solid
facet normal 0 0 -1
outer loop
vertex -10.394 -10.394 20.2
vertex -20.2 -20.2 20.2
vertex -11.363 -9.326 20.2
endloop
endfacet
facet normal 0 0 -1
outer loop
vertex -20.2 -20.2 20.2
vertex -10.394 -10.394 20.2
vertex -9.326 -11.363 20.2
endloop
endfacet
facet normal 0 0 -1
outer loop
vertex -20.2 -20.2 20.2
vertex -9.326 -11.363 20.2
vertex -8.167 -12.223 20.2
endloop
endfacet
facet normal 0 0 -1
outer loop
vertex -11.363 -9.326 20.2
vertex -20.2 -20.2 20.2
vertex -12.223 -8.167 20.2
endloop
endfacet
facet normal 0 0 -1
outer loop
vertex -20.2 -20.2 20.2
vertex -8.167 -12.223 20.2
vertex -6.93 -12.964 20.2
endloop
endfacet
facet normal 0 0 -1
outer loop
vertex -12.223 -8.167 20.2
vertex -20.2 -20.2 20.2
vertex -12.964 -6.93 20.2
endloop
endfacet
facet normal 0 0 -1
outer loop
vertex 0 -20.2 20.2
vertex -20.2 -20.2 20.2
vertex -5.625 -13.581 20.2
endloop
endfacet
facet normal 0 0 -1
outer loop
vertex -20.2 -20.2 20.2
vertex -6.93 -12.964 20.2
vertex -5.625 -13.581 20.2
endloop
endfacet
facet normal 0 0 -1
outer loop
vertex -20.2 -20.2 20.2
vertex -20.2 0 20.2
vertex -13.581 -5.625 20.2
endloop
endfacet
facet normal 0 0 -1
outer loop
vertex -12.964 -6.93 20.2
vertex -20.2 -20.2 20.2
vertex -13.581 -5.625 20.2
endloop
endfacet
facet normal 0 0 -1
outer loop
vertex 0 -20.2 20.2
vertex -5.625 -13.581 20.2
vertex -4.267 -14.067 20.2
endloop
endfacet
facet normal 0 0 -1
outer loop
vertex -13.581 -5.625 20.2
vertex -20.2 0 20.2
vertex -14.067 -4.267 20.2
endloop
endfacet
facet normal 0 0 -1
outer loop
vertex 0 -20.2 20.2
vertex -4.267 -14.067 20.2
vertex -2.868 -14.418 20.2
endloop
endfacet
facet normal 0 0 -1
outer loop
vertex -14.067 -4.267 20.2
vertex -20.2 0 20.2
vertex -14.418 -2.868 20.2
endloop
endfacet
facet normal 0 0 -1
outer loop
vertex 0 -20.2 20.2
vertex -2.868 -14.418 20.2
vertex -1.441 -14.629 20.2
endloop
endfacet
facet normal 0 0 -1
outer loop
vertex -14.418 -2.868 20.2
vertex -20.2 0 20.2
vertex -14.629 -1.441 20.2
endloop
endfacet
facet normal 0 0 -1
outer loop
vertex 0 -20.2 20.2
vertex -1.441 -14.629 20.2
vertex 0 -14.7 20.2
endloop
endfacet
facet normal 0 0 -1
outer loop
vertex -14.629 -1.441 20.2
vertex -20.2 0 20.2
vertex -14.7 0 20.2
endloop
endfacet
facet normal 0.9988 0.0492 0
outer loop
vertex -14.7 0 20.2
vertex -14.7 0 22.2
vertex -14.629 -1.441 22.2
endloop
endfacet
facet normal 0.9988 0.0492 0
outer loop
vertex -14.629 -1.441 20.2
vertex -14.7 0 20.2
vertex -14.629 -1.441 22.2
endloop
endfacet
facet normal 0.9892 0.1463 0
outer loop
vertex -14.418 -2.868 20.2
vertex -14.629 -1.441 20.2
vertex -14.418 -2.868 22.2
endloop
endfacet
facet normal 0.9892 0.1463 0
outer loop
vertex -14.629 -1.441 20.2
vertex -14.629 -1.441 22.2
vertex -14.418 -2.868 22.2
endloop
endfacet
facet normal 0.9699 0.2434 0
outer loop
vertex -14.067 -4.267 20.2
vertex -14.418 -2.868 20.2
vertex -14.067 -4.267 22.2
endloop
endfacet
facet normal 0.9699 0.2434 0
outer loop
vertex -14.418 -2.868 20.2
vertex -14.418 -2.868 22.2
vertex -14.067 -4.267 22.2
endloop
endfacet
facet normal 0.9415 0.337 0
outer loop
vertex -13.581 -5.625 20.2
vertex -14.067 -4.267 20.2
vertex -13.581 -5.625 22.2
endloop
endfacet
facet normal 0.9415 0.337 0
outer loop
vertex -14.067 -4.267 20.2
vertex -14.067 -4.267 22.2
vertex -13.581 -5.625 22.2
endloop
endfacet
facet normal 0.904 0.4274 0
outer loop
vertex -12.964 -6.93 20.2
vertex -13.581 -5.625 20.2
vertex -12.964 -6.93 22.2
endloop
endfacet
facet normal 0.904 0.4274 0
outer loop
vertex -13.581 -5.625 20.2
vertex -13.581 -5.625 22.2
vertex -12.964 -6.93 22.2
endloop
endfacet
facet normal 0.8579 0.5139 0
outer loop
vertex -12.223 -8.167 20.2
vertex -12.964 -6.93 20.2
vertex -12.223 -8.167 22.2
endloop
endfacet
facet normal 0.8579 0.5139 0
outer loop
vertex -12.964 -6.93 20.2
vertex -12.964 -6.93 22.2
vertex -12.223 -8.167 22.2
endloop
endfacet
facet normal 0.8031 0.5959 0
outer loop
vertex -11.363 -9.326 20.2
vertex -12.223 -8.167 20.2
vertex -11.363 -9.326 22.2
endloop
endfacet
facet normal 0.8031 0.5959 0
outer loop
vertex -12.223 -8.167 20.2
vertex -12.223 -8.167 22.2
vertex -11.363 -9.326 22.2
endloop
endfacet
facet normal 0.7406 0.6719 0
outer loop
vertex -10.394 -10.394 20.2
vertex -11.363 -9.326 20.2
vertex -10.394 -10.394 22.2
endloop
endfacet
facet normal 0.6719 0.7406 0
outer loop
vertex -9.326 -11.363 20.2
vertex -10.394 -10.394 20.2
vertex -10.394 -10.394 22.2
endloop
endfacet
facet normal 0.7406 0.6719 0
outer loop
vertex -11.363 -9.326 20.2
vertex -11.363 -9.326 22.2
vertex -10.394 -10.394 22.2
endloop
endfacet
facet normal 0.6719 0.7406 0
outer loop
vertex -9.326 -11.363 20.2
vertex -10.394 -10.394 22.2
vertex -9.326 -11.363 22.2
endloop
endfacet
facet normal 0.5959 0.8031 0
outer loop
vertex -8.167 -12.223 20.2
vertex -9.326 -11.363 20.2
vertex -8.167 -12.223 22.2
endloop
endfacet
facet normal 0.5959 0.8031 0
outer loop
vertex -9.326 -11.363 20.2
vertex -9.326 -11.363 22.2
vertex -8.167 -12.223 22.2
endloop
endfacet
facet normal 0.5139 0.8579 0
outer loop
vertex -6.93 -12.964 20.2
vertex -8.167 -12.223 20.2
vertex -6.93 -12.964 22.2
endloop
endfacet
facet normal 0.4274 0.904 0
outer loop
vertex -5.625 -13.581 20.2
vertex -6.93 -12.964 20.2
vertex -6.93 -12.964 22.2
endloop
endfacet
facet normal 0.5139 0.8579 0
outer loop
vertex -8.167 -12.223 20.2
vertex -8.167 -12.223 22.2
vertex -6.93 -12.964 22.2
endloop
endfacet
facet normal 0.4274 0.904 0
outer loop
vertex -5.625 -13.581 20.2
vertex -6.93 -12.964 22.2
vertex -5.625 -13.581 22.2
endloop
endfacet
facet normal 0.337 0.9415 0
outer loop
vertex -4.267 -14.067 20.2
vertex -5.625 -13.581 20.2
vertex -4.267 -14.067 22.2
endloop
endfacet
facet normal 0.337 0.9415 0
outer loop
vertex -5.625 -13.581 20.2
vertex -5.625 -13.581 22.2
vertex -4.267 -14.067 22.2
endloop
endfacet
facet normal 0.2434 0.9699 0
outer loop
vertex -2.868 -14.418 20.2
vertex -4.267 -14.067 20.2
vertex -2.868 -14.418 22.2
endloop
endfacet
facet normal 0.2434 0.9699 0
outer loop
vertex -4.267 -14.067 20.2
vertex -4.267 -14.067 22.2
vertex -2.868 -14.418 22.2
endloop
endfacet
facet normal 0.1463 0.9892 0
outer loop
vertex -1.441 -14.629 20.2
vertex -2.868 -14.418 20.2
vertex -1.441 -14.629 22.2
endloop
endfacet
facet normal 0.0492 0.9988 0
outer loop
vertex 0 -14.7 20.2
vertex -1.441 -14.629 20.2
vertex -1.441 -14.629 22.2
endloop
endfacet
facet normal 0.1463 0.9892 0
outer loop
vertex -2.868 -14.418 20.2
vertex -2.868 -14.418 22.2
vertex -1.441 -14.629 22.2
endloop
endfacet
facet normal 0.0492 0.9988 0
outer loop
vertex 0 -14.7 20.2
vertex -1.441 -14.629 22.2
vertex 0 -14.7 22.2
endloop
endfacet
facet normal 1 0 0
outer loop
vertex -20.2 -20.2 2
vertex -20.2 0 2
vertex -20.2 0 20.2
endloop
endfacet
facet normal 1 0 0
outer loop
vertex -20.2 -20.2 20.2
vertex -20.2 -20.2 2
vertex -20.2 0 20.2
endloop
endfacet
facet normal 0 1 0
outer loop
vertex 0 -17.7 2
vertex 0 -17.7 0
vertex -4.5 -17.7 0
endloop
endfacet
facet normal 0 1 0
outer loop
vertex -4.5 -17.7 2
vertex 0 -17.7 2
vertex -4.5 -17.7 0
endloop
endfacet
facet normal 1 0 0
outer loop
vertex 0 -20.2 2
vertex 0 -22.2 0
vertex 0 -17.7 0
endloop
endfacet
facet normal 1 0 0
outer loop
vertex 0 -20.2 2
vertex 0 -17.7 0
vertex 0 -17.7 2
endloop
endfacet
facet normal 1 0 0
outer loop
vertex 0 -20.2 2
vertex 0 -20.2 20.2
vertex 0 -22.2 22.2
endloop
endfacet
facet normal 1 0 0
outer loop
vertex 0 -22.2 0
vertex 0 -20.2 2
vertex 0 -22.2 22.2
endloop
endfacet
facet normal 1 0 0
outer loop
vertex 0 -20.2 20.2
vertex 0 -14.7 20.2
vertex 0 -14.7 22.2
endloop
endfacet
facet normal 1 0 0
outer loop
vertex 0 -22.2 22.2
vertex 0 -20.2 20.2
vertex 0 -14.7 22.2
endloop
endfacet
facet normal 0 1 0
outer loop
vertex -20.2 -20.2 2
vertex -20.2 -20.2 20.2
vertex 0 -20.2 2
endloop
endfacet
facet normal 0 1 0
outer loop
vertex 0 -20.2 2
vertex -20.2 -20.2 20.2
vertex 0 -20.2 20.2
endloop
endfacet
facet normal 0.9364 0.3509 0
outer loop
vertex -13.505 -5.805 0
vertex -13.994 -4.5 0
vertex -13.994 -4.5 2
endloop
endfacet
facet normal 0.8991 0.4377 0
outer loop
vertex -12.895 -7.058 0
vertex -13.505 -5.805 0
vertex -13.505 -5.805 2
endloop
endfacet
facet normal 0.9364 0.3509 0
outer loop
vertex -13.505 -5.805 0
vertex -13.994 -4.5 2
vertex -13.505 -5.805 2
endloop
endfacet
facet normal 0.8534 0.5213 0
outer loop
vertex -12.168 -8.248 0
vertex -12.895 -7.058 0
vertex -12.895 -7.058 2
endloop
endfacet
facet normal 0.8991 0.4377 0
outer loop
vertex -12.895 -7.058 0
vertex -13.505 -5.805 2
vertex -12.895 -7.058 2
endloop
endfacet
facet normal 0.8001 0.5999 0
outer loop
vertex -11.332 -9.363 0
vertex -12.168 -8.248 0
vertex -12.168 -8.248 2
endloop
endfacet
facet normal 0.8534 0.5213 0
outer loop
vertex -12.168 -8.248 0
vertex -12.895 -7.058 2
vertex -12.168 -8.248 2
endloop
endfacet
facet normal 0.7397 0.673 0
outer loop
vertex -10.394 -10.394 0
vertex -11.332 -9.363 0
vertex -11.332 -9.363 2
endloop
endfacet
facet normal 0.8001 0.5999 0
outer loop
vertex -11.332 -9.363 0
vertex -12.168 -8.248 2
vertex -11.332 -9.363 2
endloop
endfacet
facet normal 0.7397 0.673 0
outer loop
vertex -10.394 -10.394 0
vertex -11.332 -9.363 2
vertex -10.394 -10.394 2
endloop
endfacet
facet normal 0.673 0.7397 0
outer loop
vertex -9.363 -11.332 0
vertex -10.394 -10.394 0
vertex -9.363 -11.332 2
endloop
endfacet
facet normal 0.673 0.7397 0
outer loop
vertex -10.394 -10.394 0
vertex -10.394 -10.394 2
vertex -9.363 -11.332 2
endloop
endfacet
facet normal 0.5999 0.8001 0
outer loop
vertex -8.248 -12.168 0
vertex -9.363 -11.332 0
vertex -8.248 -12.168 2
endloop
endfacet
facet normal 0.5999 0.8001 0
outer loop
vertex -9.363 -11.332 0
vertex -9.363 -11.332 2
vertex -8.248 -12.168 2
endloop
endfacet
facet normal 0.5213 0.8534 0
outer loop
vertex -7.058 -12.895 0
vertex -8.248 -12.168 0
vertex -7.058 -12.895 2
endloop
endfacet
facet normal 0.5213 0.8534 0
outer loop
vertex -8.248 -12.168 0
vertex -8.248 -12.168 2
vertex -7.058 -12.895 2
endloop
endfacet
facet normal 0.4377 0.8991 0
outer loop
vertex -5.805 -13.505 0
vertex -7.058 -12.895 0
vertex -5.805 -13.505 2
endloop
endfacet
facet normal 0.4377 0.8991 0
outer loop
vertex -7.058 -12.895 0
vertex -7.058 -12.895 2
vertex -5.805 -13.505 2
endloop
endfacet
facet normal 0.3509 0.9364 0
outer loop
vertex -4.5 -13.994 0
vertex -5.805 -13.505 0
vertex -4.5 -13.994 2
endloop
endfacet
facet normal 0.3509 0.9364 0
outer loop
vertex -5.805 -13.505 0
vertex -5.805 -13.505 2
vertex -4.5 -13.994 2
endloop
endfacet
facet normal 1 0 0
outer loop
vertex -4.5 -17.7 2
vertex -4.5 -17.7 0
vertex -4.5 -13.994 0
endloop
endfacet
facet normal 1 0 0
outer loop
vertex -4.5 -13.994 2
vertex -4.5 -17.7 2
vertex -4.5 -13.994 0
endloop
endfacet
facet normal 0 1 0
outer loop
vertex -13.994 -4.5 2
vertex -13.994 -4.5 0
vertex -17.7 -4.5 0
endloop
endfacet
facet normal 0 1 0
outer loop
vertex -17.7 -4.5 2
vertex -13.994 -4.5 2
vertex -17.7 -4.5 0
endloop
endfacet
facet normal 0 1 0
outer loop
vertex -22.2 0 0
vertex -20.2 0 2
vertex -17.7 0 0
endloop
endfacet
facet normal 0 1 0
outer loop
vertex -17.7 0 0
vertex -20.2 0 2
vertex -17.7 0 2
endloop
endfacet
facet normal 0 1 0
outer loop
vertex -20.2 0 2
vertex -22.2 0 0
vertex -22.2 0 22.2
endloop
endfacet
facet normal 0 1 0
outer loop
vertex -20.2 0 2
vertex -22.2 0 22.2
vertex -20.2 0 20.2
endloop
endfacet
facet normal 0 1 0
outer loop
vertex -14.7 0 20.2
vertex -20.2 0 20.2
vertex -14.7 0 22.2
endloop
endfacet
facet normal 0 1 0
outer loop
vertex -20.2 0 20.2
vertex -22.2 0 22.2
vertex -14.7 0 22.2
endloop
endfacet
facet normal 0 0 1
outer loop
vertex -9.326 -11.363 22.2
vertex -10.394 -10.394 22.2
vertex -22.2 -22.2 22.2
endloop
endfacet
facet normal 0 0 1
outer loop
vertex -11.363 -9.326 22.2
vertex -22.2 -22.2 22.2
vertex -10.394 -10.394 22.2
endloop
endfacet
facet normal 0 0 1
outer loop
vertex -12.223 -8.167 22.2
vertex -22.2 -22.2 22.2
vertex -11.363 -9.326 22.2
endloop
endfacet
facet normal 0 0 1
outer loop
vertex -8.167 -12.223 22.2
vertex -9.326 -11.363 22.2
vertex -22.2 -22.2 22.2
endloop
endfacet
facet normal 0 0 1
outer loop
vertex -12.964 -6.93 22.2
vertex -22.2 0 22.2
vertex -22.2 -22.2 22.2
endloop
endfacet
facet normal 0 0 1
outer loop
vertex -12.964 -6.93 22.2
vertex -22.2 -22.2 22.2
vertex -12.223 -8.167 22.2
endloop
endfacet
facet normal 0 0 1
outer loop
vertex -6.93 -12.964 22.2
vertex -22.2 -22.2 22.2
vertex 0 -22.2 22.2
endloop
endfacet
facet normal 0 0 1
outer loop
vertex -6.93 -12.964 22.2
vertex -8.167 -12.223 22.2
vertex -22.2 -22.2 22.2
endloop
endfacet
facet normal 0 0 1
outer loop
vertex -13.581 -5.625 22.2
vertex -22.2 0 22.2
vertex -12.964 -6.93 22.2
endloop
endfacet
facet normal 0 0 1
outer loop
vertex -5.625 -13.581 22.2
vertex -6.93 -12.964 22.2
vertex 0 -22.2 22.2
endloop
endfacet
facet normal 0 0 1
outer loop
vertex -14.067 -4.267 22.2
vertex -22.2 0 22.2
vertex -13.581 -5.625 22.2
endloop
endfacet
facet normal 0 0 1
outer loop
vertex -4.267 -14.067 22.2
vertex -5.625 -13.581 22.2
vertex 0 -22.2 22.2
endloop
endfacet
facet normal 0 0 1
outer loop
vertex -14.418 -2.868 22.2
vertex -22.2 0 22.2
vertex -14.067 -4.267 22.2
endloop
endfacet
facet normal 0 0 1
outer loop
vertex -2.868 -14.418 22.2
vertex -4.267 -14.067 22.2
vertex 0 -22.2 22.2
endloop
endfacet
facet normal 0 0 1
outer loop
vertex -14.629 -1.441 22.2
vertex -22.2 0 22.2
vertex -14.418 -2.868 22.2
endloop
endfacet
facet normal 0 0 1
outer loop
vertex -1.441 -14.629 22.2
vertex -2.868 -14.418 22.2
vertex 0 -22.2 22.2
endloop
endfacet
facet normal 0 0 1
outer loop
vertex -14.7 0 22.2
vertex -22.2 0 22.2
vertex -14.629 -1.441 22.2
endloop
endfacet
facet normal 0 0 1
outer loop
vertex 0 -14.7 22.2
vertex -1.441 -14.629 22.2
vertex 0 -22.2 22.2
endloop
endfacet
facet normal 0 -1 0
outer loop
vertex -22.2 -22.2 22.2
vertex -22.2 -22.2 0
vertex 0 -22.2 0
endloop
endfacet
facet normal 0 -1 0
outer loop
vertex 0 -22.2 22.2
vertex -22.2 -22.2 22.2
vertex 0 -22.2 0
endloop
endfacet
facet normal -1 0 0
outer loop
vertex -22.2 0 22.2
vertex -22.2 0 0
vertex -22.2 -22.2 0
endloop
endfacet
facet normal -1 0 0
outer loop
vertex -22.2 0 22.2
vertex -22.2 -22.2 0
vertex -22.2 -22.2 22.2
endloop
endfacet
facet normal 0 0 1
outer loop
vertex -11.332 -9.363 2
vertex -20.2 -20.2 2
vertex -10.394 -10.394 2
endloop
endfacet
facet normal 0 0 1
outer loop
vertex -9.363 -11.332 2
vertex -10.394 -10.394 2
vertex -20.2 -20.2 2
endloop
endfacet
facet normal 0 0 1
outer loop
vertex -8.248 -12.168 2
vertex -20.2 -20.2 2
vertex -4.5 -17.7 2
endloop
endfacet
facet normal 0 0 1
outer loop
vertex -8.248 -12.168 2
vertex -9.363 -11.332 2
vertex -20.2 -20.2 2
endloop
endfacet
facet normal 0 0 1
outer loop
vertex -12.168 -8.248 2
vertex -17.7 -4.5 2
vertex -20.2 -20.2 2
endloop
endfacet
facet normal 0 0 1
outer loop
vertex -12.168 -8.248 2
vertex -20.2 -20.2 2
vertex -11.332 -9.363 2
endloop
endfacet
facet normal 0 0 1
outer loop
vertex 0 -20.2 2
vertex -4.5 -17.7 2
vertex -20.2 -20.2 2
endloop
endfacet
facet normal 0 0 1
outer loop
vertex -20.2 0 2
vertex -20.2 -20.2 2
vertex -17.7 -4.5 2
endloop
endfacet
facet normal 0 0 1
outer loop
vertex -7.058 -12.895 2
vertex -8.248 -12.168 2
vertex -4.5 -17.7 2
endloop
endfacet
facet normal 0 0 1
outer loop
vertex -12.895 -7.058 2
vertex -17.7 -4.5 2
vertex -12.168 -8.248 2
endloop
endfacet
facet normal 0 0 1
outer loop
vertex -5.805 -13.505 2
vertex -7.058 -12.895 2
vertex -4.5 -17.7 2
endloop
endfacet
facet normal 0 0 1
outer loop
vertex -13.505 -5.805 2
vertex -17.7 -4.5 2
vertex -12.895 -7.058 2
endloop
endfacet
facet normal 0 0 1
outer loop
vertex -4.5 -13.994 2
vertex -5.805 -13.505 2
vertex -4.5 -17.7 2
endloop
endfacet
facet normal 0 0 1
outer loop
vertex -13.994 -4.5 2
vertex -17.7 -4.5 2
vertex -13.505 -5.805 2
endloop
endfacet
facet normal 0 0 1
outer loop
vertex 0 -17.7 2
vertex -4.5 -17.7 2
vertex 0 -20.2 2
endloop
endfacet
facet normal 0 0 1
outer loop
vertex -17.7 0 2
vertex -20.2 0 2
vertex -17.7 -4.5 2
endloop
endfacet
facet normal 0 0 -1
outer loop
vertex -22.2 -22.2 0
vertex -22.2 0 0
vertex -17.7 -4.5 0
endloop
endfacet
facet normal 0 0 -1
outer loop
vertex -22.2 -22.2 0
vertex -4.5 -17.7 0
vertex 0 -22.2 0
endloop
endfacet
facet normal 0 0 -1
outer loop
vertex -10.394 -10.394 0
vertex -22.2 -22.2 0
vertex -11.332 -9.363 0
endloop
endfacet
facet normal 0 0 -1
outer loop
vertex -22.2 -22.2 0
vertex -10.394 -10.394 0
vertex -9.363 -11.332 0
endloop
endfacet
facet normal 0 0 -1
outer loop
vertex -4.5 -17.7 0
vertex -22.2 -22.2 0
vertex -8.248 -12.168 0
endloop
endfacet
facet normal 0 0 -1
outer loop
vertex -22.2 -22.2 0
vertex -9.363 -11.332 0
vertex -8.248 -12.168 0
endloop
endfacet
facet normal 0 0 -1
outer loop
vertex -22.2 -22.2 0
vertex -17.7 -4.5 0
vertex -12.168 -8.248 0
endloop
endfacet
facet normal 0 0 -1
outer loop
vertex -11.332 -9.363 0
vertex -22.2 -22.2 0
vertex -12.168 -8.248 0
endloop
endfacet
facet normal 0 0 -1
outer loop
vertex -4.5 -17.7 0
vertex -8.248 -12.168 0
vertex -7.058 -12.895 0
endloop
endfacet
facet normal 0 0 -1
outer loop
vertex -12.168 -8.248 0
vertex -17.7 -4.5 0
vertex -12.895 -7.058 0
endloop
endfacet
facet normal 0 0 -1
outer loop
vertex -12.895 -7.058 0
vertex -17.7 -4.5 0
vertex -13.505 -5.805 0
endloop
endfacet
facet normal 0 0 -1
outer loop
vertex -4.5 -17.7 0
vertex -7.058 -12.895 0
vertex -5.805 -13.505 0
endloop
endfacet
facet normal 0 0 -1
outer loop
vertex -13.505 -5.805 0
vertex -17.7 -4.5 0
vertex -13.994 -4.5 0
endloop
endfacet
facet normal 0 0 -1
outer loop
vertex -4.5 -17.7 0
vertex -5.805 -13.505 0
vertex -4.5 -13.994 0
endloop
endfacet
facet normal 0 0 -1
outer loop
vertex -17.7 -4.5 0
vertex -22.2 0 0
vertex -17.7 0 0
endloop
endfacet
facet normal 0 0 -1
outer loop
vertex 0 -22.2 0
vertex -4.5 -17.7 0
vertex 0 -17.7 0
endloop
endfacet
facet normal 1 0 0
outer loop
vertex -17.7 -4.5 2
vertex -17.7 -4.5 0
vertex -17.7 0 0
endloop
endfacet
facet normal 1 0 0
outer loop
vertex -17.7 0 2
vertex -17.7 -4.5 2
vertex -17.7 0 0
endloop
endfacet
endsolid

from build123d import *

# Parameters (mm, degrees)
F0_W     = 22.2
F0_H     = 22.2
F1_DEPTH = 22.2
F2_T     = -2
F4_DEPTH = 22.201
F6_DEPTH = 2.5


with BuildPart() as f1:
    # F0 (on Front) → F1 (new body)
    with BuildSketch(Plane.XZ):
        with Locations((-11.1, 11.1)):
            Rectangle(F0_W, F0_H)
    extrude(amount=F1_DEPTH)

    # F2
    f2_openings = [f1.faces().sort_by_distance(p)[0] for p in [
        (0, -11.1, 11.1),
        (-11.1, 0, 11.1),
    ]]
    offset(amount=F2_T, openings=f2_openings)

    # F3 (on face) → F4 (cut, through all)
    with BuildSketch(Plane.XY.offset(22.2)):
        with BuildLine():
            Line((0, 0), (-14.7, 0))
            ThreePointArc((-14.7, 0), (-10.39447, -10.39447), (0, -14.7))
            Line((0, -14.7), (0, 0))
        make_face()
    extrude(amount=-F4_DEPTH, mode=Mode.SUBTRACT)

    # F5 (on face) → F6 (cut)
    with BuildSketch(Plane(origin=(0, 0, 0), x_dir=(1, 0, 0), z_dir=(0, 0, -1))):
        with BuildLine():
            Line((-17.7, 4.5), (-17.7, 0))
            Line((-17.7, 0), (-14.7, 0))
            ThreePointArc((-14.7, 0), (-14.522499, 2.277501), (-13.994285, 4.5))
            Line((-13.994285, 4.5), (-17.7, 4.5))
        make_face()
        with BuildLine():
            Line((0, 14.7), (0, 17.7))
            Line((0, 17.7), (-4.5, 17.7))
            Line((-4.5, 17.7), (-4.5, 13.994285))
            ThreePointArc((-4.5, 13.994285), (-2.277501, 14.522499), (0, 14.7))
        make_face()
    extrude(amount=-F6_DEPTH, mode=Mode.SUBTRACT)


solid = f1.part
